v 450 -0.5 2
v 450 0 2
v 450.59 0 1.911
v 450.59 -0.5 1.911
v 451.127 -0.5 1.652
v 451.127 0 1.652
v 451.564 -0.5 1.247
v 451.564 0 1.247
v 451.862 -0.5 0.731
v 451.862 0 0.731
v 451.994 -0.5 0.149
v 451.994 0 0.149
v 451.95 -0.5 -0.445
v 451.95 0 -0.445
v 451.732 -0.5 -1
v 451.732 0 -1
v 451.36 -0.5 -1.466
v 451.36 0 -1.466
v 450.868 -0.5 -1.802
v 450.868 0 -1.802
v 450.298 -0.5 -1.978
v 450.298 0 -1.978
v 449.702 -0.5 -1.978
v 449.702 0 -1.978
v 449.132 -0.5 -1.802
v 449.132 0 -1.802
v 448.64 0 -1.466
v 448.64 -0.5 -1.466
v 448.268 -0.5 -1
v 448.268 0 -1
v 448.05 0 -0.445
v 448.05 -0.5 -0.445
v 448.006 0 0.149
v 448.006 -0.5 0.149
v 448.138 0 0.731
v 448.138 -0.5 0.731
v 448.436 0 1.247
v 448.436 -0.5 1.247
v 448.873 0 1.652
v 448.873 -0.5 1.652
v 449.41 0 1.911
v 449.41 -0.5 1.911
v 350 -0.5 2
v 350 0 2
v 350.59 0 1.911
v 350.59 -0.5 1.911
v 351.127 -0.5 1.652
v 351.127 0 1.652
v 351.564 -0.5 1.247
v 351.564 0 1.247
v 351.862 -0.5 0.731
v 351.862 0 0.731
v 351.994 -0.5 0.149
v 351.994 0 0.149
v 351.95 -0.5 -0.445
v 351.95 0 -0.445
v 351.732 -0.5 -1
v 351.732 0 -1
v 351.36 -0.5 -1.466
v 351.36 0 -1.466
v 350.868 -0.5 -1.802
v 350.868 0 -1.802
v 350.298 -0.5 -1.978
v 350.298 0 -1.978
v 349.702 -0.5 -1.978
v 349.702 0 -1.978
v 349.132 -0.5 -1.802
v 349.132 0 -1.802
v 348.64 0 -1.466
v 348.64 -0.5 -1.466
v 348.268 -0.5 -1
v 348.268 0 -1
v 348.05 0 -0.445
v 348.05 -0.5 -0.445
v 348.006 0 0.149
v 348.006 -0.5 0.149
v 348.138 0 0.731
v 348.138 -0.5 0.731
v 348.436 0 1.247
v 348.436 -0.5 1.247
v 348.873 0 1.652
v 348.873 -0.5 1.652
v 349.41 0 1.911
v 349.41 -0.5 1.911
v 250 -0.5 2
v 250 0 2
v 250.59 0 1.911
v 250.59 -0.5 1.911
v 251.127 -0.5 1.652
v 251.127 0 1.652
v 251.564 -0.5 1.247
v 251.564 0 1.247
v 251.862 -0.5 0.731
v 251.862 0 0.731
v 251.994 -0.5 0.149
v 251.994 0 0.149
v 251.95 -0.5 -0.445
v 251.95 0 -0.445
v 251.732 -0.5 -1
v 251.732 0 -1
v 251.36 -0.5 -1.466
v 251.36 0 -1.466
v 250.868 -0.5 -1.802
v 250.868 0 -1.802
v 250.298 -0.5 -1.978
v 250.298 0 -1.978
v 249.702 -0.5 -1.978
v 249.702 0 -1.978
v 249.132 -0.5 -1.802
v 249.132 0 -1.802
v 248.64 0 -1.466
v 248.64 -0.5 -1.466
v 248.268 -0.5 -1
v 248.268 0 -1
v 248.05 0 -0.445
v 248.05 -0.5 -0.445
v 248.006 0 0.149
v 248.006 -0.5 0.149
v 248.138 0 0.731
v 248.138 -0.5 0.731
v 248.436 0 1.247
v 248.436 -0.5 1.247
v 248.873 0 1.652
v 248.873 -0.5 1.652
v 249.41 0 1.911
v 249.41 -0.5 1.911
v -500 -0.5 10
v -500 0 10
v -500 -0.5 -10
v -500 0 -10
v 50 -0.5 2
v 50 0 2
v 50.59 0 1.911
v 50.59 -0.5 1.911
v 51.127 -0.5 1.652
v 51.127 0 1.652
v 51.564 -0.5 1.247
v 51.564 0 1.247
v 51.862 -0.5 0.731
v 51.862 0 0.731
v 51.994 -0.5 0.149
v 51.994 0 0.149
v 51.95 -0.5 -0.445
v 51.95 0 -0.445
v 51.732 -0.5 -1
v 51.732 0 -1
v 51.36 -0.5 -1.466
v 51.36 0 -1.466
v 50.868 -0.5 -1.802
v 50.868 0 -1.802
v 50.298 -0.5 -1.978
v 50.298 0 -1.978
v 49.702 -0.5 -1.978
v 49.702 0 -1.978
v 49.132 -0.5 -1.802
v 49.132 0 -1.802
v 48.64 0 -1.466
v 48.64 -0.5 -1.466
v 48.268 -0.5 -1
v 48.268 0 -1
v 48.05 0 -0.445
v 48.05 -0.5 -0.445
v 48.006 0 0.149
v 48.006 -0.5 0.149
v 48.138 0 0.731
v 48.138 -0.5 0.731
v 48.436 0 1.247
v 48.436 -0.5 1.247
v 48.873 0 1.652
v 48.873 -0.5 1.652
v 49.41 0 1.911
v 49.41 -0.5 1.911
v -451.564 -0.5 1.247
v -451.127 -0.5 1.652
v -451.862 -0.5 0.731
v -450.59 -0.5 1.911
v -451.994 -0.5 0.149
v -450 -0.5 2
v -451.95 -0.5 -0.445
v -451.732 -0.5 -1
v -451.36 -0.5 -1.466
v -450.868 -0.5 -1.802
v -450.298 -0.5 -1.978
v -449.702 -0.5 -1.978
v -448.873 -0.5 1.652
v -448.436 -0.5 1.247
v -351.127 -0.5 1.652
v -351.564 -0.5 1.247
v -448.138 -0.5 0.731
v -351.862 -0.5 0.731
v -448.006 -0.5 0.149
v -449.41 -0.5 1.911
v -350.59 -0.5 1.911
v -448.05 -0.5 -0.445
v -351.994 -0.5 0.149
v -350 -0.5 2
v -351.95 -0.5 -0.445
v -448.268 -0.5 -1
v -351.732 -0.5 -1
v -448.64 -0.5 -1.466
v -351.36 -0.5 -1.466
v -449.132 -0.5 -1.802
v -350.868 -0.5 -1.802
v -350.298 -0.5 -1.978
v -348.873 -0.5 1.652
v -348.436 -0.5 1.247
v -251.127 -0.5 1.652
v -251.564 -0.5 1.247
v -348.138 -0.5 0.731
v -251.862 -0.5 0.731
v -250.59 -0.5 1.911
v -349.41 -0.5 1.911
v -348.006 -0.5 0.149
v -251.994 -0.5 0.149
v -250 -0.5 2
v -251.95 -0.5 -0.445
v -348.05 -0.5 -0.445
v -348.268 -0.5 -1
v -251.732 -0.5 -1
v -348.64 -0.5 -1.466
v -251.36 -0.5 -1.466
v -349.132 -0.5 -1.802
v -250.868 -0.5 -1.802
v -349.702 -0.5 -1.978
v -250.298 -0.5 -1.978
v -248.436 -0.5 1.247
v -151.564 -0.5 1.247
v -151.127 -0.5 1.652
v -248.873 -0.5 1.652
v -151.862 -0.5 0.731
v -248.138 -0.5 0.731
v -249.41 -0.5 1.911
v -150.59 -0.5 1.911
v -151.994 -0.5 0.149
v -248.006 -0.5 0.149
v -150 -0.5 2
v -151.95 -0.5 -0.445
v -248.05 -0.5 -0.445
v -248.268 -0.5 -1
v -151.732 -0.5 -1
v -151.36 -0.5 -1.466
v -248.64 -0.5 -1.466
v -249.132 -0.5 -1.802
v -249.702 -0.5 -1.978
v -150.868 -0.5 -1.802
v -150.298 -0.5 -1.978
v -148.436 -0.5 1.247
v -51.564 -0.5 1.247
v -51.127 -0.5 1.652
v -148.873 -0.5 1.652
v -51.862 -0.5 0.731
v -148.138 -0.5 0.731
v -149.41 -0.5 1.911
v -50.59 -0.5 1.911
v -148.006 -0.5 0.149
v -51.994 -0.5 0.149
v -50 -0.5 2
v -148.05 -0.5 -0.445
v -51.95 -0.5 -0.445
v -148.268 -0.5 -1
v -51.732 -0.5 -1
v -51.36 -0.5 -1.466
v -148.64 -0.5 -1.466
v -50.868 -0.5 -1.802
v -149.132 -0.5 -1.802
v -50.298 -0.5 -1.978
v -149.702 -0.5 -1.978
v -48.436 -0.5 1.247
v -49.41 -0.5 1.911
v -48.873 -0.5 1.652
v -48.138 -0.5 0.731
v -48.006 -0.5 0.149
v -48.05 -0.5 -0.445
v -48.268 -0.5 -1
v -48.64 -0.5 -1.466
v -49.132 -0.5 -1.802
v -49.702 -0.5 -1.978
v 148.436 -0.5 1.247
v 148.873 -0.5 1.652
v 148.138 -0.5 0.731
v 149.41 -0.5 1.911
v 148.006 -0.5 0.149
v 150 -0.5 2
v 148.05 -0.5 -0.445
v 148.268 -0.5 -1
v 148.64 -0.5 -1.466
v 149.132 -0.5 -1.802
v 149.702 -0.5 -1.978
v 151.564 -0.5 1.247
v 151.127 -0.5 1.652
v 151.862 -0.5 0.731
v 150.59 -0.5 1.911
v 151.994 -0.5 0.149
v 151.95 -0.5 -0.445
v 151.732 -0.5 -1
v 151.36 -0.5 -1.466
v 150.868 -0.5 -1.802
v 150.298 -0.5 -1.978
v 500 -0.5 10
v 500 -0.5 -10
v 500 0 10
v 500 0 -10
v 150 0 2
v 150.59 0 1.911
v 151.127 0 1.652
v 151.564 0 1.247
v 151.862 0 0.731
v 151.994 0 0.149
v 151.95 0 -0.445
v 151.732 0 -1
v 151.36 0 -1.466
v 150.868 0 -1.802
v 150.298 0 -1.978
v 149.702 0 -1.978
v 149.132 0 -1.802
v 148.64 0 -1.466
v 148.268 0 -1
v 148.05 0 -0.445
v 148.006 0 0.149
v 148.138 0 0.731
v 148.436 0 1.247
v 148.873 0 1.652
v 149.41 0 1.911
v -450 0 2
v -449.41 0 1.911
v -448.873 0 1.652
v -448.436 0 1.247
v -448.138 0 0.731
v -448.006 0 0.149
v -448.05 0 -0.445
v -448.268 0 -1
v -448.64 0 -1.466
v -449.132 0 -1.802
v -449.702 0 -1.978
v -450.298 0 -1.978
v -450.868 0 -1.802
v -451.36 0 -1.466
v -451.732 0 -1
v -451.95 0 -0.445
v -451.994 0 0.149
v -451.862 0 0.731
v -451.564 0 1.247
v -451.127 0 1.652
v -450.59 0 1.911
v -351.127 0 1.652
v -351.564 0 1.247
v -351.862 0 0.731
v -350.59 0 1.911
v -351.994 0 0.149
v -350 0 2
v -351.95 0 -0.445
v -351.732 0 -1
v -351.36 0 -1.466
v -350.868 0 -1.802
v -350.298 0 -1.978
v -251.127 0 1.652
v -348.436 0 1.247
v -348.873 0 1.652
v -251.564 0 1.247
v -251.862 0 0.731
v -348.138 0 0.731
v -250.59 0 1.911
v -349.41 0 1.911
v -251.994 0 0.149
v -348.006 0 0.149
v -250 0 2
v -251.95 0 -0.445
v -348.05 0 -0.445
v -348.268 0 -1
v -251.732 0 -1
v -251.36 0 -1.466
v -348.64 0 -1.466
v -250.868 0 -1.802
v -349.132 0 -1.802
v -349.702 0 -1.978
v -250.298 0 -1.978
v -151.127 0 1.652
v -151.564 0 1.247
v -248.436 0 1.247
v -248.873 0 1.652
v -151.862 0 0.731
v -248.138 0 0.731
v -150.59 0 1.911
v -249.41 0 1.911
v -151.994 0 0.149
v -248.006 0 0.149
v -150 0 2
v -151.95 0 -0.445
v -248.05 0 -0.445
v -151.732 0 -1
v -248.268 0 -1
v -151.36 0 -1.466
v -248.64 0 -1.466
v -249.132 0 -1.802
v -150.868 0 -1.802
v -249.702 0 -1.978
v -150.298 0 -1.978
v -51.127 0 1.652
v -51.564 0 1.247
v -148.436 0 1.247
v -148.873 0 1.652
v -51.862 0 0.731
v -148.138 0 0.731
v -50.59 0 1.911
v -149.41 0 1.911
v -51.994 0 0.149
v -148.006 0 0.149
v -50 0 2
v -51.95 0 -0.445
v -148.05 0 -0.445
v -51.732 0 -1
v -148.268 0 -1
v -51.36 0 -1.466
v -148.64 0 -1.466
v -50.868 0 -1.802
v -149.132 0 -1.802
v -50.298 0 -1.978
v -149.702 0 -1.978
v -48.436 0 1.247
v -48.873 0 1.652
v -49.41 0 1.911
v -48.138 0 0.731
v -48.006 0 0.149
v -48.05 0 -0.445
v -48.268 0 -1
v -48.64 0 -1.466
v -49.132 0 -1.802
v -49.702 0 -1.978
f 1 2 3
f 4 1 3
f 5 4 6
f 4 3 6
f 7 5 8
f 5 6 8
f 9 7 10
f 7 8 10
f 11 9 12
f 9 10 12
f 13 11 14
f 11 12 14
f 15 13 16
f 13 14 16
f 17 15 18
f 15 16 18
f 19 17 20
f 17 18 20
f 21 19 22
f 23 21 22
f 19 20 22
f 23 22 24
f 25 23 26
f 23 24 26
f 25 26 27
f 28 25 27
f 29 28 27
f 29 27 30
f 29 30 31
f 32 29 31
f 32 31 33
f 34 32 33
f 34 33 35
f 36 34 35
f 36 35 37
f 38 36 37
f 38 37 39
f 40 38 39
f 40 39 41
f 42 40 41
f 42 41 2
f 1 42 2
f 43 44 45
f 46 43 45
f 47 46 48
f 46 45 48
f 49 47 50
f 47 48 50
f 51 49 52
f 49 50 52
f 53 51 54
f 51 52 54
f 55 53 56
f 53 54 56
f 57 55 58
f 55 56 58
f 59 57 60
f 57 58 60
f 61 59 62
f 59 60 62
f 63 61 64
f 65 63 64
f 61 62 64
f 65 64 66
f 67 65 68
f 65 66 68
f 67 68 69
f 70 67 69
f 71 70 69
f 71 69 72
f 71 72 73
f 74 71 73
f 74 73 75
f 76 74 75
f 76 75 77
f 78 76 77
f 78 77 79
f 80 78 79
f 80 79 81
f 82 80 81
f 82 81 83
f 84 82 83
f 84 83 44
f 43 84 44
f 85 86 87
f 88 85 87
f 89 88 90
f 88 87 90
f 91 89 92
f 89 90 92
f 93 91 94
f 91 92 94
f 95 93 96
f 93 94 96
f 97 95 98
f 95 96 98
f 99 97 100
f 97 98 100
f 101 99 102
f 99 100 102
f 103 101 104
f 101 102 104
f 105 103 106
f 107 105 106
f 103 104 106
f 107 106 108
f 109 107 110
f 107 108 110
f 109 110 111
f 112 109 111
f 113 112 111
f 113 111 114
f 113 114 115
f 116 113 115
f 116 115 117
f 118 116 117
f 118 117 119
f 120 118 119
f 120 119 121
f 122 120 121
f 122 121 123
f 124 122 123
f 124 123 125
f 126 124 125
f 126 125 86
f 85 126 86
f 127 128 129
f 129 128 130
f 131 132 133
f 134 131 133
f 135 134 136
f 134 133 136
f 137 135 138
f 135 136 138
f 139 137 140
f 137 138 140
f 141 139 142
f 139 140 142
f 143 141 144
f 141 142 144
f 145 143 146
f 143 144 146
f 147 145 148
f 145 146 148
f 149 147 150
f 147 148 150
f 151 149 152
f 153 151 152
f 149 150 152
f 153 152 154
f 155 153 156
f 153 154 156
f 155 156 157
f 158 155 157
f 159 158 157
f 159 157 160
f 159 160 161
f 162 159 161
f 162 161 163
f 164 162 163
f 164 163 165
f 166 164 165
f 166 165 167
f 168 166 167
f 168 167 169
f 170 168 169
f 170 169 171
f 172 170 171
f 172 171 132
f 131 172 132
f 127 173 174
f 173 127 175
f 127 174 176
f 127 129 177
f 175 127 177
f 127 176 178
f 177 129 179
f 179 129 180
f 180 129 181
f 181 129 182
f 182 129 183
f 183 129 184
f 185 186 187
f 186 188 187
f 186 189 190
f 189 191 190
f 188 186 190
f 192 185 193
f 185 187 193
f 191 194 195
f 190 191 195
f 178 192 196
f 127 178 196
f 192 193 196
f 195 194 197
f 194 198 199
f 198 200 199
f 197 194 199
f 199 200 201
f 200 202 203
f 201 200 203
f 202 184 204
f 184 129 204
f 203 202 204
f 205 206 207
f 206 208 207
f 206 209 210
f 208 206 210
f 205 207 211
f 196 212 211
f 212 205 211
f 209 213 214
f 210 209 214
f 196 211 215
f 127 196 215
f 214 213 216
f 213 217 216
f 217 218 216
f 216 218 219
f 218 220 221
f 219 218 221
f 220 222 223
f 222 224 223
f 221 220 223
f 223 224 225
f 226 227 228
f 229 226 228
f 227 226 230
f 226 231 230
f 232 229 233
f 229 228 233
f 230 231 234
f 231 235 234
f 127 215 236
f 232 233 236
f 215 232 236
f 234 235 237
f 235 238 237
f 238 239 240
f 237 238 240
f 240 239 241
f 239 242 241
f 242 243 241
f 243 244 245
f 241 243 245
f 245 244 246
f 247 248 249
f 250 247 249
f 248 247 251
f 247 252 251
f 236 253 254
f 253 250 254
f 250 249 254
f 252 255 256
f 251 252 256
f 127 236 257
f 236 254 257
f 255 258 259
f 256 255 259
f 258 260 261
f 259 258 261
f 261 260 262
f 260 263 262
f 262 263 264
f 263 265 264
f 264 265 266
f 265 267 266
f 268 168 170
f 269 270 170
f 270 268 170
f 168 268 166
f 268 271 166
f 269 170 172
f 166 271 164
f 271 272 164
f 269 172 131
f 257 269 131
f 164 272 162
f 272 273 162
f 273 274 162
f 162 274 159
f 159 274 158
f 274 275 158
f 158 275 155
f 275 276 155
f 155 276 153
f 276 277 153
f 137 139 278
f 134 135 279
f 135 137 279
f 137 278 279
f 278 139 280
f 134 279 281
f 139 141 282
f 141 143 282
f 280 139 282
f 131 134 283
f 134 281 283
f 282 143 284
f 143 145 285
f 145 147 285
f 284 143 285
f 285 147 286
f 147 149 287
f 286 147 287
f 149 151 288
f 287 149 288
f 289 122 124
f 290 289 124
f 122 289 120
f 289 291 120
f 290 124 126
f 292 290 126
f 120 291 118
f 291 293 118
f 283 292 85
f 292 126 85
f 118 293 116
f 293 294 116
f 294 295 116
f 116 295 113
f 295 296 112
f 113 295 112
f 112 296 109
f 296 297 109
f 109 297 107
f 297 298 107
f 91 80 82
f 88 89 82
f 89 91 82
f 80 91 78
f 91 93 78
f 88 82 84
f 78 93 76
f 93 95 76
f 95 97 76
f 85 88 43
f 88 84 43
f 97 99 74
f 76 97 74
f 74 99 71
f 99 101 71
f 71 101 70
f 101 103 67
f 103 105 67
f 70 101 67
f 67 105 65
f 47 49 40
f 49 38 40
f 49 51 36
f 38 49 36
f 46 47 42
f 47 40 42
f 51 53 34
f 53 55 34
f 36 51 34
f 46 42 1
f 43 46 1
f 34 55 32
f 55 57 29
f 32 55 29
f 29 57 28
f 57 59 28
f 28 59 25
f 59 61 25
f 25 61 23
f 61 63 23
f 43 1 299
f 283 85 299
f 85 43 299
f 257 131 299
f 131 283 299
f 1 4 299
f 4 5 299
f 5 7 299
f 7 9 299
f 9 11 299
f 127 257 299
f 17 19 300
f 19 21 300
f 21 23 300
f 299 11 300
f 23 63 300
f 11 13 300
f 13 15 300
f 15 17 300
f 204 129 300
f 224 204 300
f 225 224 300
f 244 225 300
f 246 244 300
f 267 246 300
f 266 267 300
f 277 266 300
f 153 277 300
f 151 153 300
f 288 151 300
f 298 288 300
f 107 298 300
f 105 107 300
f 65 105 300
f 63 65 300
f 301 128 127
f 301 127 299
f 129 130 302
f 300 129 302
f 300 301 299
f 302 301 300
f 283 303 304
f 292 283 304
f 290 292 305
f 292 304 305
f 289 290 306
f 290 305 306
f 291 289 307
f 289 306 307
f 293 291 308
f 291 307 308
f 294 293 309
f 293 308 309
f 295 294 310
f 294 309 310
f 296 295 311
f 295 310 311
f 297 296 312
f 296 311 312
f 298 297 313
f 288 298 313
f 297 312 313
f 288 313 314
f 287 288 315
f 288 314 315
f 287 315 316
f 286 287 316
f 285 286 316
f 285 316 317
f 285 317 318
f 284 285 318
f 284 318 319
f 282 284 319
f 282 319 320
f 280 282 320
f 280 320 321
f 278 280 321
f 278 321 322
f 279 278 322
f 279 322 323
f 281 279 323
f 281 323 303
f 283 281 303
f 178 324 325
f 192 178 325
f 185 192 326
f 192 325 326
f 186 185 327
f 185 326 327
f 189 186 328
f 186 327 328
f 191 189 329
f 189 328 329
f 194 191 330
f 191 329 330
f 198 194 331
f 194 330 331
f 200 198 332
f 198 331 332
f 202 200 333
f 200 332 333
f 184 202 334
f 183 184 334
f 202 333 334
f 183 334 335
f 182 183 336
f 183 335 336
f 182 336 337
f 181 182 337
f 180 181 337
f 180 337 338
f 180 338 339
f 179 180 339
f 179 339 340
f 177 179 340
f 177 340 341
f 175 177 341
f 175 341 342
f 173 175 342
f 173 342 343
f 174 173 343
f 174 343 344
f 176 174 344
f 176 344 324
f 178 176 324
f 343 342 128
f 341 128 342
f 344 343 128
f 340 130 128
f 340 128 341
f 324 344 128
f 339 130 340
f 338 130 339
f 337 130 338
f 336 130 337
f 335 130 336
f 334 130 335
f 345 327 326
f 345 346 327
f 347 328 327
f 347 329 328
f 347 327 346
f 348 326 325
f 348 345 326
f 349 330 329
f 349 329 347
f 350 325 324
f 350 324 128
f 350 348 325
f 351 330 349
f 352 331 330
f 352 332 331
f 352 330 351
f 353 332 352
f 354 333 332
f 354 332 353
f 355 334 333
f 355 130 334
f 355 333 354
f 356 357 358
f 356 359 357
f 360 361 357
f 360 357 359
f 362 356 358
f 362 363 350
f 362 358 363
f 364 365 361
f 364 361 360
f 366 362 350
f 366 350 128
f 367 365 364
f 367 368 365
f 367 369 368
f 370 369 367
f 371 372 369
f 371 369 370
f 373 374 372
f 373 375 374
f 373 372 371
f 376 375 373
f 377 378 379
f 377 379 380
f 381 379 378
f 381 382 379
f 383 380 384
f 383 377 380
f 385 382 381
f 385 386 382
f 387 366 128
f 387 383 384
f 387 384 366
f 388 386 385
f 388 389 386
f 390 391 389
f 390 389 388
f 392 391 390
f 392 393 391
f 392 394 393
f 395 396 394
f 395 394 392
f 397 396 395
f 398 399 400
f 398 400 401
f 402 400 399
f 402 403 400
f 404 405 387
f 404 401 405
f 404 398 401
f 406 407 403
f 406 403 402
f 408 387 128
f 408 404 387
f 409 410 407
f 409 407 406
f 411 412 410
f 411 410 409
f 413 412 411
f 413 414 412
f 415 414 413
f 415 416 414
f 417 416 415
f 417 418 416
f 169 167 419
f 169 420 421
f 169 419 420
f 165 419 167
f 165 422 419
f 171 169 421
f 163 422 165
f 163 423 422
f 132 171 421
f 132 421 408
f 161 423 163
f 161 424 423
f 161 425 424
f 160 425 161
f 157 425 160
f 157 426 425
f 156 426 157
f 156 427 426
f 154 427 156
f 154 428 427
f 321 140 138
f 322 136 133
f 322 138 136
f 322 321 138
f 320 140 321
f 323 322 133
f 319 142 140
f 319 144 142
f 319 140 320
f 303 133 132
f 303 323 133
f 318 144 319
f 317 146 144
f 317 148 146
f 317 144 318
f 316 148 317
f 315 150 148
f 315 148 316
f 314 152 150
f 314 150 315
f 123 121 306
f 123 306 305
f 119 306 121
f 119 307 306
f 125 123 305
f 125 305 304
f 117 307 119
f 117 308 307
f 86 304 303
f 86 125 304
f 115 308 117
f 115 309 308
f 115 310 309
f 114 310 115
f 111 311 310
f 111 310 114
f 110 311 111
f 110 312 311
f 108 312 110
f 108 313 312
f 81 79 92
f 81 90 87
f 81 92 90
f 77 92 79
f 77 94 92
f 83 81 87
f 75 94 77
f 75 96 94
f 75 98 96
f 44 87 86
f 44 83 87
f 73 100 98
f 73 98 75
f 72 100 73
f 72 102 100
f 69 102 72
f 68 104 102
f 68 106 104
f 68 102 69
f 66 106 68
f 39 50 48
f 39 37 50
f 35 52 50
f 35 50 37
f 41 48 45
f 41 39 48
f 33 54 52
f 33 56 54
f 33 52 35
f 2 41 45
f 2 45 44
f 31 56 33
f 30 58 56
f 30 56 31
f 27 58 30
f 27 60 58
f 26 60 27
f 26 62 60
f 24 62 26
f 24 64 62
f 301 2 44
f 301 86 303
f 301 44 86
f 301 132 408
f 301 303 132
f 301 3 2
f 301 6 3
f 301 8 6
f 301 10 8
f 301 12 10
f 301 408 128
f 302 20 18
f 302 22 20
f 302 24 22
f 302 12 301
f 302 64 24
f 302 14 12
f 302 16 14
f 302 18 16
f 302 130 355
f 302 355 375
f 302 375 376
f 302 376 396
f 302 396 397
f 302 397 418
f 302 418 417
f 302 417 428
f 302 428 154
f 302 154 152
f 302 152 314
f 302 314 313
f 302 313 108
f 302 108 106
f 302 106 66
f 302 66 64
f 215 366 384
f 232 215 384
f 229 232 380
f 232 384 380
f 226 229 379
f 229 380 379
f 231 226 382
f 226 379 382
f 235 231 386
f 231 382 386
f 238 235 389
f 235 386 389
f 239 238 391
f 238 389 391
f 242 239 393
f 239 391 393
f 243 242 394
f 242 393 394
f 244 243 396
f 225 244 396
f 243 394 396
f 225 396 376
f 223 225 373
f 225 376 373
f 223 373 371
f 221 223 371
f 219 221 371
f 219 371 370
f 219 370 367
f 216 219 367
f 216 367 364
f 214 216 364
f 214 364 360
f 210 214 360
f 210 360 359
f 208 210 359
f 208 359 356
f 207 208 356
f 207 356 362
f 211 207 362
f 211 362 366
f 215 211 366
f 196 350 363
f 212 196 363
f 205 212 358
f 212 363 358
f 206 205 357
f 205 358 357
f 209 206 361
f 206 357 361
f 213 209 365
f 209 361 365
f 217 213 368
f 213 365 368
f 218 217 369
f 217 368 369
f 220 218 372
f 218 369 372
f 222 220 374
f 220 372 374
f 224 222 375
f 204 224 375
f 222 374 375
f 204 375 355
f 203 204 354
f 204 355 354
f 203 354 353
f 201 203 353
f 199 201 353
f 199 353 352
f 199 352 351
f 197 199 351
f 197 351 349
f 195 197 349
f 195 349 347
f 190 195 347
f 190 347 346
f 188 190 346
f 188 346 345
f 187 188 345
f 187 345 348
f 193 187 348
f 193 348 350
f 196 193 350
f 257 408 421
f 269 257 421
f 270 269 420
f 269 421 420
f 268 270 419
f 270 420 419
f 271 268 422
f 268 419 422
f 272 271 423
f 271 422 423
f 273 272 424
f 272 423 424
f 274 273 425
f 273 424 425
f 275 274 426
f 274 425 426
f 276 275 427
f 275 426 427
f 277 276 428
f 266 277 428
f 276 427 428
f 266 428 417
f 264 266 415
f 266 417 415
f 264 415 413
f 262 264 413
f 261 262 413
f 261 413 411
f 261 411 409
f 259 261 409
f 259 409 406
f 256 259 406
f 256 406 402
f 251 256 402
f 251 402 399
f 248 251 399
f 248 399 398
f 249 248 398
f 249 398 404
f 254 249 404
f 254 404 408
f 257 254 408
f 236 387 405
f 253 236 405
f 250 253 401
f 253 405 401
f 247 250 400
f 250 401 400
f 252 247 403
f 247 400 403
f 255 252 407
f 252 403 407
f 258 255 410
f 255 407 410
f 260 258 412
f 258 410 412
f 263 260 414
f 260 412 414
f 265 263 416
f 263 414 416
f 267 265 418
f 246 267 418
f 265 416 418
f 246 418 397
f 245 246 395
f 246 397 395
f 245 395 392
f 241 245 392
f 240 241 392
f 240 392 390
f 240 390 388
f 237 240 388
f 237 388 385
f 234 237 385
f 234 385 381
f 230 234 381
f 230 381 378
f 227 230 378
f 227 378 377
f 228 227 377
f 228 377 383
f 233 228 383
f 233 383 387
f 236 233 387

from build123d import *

# Parameters (mm, degrees)
SKETCH1_W          = 1000
SKETCH1_H          = 20
BASE_FLANGE1_DEPTH = 0.5
SKETCH2_R          = 2
CUT_EXTRUDE1_DEPTH = 10


# Sheet-metal steps are written as plain solids
with BuildPart() as part:
    # Sketch1 → Base-Flange1 (new body)
    with BuildSketch(Plane(origin=(0, 0, 0), x_dir=(1, 0, 0), z_dir=(0, 1, 0))):
        Rectangle(SKETCH1_W, SKETCH1_H)
    extrude(amount=-BASE_FLANGE1_DEPTH)

    # Sketch2 → Cut-Extrude1 (cut)
    with BuildSketch(Plane(origin=(0, 0, 0), x_dir=(1, 0, 0), z_dir=(0, 1, 0))):
        with Locations(Location((-450, 0, 0), (0, 0, 270))):
            Circle(SKETCH2_R)
        with Locations(Location((-350, 0, 0), (0, 0, 270))):
            Circle(SKETCH2_R)
        with Locations(Location((-250, 0, 0), (0, 0, 270))):
            Circle(SKETCH2_R)
        with Locations(Location((-150, 0, 0), (0, 0, 270))):
            Circle(SKETCH2_R)
        with Locations(Location((-50, 0, 0), (0, 0, 270))):
            Circle(SKETCH2_R)
        with Locations(Location((50, 0, 0), (0, 0, 270))):
            Circle(SKETCH2_R)
        with Locations(Location((150, 0, 0), (0, 0, 270))):
            Circle(SKETCH2_R)
        with Locations(Location((250, 0, 0), (0, 0, 270))):
            Circle(SKETCH2_R)
        with Locations(Location((350, 0, 0), (0, 0, 270))):
            Circle(SKETCH2_R)
        with Locations(Location((450, 0, 0), (0, 0, 270))):
            Circle(SKETCH2_R)
    extrude(amount=-CUT_EXTRUDE1_DEPTH, mode=Mode.SUBTRACT)


solid = part.part
